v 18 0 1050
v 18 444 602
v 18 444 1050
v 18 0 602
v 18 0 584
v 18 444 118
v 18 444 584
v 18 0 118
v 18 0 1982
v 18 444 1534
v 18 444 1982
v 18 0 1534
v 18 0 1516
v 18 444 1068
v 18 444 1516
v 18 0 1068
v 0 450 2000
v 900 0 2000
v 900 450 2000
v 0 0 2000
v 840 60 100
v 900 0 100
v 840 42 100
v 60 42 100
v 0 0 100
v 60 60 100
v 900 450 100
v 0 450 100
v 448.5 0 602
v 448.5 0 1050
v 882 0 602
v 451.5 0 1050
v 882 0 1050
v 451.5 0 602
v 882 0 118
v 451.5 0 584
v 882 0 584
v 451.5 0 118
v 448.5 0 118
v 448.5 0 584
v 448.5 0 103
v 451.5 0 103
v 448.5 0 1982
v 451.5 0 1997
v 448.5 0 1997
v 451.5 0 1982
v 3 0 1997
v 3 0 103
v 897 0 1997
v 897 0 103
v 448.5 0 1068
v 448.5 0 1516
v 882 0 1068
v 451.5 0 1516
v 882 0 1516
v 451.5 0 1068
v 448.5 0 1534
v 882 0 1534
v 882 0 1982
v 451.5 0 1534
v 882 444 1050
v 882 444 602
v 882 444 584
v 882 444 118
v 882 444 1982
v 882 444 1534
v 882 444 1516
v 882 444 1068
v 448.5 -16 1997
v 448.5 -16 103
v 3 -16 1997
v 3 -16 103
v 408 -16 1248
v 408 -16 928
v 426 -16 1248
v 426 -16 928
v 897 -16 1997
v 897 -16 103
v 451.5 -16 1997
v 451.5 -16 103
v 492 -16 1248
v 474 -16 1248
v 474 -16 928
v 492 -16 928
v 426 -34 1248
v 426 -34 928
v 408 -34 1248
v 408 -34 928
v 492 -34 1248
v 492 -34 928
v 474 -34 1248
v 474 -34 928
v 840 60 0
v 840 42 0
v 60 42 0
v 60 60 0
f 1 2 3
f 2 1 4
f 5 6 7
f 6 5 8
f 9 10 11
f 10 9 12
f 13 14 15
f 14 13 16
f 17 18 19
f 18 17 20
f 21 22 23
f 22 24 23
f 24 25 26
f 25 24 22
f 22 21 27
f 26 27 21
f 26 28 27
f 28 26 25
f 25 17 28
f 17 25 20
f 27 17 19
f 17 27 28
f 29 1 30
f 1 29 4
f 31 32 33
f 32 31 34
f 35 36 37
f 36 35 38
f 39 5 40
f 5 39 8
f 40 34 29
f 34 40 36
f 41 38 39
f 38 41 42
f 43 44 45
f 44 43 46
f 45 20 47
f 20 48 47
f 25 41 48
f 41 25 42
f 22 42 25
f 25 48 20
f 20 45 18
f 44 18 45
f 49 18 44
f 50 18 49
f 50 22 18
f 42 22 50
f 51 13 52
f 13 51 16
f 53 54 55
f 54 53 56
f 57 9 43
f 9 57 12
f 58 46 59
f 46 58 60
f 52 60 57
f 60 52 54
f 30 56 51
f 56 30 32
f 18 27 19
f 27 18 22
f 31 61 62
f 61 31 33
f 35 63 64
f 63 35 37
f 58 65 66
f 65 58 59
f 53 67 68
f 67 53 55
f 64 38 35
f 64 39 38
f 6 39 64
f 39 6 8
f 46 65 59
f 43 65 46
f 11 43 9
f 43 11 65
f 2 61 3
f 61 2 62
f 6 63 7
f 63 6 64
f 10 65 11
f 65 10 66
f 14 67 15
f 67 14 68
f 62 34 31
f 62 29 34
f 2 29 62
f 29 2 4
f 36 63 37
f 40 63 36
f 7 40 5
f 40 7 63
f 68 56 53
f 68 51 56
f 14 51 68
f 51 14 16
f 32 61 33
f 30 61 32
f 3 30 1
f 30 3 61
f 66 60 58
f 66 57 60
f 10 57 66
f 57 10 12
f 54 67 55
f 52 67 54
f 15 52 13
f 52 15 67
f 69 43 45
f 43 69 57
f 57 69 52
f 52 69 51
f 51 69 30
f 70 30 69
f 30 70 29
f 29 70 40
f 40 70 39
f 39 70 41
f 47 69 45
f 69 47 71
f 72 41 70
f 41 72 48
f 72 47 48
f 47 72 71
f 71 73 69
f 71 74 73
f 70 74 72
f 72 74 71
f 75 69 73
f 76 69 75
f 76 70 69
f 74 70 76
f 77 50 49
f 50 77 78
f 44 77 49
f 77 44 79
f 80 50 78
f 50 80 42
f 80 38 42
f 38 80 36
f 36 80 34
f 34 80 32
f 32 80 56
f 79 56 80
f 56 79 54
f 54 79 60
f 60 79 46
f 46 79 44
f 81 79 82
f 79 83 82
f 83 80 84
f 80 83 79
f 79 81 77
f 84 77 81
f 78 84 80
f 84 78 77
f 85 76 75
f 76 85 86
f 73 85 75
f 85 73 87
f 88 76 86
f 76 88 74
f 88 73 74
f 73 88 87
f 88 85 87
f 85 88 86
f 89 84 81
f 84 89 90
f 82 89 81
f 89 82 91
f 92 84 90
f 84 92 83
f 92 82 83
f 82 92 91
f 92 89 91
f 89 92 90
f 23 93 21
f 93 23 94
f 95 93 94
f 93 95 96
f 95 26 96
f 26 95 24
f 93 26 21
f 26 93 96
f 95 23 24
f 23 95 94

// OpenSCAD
// Cupboard benchmark generated for OpenSCAD.
// Units: millimeters. Coordinate system: X width, Y depth, Z up.
$fn = 32;

module part_box(label, pos, size, rgb) {
  // OpenSCAD does not preserve part names in mesh output; label is kept for source readability.
  color(rgb) translate(pos) cube(size, center = false);
}

part_box("left_side", [0.0000, 0.0000, 100.0000], [18.0000, 450.0000, 1900.0000], [0.8039, 0.6706, 0.4549]);
part_box("right_side", [882.0000, 0.0000, 100.0000], [18.0000, 450.0000, 1900.0000], [0.8039, 0.6706, 0.4549]);
part_box("bottom_panel", [18.0000, 0.0000, 100.0000], [864.0000, 450.0000, 18.0000], [0.6745, 0.5176, 0.3216]);
part_box("top_panel", [18.0000, 0.0000, 1982.0000], [864.0000, 450.0000, 18.0000], [0.6745, 0.5176, 0.3216]);
part_box("back_panel", [18.0000, 444.0000, 118.0000], [864.0000, 6.0000, 1864.0000], [0.6902, 0.7255, 0.7020]);
part_box("adjustable_shelf_1", [18.0000, 0.0000, 584.0000], [864.0000, 444.0000, 18.0000], [0.8392, 0.7255, 0.5137]);
part_box("adjustable_shelf_2", [18.0000, 0.0000, 1050.0000], [864.0000, 444.0000, 18.0000], [0.8392, 0.7255, 0.5137]);
part_box("adjustable_shelf_3", [18.0000, 0.0000, 1516.0000], [864.0000, 444.0000, 18.0000], [0.8392, 0.7255, 0.5137]);
part_box("left_door", [3.0000, -16.0000, 103.0000], [445.5000, 16.0000, 1894.0000], [0.9020, 0.8392, 0.7098]);
part_box("right_door", [451.5000, -16.0000, 103.0000], [445.5000, 16.0000, 1894.0000], [0.9020, 0.8392, 0.7098]);
part_box("left_handle", [408.0000, -34.0000, 928.0000], [18.0000, 18.0000, 320.0000], [0.1804, 0.1922, 0.2039]);
part_box("right_handle", [474.0000, -34.0000, 928.0000], [18.0000, 18.0000, 320.0000], [0.1804, 0.1922, 0.2039]);
part_box("recessed_toe_kick", [60.0000, 42.0000, 0.0000], [780.0000, 18.0000, 100.0000], [0.3059, 0.2863, 0.2627]);
